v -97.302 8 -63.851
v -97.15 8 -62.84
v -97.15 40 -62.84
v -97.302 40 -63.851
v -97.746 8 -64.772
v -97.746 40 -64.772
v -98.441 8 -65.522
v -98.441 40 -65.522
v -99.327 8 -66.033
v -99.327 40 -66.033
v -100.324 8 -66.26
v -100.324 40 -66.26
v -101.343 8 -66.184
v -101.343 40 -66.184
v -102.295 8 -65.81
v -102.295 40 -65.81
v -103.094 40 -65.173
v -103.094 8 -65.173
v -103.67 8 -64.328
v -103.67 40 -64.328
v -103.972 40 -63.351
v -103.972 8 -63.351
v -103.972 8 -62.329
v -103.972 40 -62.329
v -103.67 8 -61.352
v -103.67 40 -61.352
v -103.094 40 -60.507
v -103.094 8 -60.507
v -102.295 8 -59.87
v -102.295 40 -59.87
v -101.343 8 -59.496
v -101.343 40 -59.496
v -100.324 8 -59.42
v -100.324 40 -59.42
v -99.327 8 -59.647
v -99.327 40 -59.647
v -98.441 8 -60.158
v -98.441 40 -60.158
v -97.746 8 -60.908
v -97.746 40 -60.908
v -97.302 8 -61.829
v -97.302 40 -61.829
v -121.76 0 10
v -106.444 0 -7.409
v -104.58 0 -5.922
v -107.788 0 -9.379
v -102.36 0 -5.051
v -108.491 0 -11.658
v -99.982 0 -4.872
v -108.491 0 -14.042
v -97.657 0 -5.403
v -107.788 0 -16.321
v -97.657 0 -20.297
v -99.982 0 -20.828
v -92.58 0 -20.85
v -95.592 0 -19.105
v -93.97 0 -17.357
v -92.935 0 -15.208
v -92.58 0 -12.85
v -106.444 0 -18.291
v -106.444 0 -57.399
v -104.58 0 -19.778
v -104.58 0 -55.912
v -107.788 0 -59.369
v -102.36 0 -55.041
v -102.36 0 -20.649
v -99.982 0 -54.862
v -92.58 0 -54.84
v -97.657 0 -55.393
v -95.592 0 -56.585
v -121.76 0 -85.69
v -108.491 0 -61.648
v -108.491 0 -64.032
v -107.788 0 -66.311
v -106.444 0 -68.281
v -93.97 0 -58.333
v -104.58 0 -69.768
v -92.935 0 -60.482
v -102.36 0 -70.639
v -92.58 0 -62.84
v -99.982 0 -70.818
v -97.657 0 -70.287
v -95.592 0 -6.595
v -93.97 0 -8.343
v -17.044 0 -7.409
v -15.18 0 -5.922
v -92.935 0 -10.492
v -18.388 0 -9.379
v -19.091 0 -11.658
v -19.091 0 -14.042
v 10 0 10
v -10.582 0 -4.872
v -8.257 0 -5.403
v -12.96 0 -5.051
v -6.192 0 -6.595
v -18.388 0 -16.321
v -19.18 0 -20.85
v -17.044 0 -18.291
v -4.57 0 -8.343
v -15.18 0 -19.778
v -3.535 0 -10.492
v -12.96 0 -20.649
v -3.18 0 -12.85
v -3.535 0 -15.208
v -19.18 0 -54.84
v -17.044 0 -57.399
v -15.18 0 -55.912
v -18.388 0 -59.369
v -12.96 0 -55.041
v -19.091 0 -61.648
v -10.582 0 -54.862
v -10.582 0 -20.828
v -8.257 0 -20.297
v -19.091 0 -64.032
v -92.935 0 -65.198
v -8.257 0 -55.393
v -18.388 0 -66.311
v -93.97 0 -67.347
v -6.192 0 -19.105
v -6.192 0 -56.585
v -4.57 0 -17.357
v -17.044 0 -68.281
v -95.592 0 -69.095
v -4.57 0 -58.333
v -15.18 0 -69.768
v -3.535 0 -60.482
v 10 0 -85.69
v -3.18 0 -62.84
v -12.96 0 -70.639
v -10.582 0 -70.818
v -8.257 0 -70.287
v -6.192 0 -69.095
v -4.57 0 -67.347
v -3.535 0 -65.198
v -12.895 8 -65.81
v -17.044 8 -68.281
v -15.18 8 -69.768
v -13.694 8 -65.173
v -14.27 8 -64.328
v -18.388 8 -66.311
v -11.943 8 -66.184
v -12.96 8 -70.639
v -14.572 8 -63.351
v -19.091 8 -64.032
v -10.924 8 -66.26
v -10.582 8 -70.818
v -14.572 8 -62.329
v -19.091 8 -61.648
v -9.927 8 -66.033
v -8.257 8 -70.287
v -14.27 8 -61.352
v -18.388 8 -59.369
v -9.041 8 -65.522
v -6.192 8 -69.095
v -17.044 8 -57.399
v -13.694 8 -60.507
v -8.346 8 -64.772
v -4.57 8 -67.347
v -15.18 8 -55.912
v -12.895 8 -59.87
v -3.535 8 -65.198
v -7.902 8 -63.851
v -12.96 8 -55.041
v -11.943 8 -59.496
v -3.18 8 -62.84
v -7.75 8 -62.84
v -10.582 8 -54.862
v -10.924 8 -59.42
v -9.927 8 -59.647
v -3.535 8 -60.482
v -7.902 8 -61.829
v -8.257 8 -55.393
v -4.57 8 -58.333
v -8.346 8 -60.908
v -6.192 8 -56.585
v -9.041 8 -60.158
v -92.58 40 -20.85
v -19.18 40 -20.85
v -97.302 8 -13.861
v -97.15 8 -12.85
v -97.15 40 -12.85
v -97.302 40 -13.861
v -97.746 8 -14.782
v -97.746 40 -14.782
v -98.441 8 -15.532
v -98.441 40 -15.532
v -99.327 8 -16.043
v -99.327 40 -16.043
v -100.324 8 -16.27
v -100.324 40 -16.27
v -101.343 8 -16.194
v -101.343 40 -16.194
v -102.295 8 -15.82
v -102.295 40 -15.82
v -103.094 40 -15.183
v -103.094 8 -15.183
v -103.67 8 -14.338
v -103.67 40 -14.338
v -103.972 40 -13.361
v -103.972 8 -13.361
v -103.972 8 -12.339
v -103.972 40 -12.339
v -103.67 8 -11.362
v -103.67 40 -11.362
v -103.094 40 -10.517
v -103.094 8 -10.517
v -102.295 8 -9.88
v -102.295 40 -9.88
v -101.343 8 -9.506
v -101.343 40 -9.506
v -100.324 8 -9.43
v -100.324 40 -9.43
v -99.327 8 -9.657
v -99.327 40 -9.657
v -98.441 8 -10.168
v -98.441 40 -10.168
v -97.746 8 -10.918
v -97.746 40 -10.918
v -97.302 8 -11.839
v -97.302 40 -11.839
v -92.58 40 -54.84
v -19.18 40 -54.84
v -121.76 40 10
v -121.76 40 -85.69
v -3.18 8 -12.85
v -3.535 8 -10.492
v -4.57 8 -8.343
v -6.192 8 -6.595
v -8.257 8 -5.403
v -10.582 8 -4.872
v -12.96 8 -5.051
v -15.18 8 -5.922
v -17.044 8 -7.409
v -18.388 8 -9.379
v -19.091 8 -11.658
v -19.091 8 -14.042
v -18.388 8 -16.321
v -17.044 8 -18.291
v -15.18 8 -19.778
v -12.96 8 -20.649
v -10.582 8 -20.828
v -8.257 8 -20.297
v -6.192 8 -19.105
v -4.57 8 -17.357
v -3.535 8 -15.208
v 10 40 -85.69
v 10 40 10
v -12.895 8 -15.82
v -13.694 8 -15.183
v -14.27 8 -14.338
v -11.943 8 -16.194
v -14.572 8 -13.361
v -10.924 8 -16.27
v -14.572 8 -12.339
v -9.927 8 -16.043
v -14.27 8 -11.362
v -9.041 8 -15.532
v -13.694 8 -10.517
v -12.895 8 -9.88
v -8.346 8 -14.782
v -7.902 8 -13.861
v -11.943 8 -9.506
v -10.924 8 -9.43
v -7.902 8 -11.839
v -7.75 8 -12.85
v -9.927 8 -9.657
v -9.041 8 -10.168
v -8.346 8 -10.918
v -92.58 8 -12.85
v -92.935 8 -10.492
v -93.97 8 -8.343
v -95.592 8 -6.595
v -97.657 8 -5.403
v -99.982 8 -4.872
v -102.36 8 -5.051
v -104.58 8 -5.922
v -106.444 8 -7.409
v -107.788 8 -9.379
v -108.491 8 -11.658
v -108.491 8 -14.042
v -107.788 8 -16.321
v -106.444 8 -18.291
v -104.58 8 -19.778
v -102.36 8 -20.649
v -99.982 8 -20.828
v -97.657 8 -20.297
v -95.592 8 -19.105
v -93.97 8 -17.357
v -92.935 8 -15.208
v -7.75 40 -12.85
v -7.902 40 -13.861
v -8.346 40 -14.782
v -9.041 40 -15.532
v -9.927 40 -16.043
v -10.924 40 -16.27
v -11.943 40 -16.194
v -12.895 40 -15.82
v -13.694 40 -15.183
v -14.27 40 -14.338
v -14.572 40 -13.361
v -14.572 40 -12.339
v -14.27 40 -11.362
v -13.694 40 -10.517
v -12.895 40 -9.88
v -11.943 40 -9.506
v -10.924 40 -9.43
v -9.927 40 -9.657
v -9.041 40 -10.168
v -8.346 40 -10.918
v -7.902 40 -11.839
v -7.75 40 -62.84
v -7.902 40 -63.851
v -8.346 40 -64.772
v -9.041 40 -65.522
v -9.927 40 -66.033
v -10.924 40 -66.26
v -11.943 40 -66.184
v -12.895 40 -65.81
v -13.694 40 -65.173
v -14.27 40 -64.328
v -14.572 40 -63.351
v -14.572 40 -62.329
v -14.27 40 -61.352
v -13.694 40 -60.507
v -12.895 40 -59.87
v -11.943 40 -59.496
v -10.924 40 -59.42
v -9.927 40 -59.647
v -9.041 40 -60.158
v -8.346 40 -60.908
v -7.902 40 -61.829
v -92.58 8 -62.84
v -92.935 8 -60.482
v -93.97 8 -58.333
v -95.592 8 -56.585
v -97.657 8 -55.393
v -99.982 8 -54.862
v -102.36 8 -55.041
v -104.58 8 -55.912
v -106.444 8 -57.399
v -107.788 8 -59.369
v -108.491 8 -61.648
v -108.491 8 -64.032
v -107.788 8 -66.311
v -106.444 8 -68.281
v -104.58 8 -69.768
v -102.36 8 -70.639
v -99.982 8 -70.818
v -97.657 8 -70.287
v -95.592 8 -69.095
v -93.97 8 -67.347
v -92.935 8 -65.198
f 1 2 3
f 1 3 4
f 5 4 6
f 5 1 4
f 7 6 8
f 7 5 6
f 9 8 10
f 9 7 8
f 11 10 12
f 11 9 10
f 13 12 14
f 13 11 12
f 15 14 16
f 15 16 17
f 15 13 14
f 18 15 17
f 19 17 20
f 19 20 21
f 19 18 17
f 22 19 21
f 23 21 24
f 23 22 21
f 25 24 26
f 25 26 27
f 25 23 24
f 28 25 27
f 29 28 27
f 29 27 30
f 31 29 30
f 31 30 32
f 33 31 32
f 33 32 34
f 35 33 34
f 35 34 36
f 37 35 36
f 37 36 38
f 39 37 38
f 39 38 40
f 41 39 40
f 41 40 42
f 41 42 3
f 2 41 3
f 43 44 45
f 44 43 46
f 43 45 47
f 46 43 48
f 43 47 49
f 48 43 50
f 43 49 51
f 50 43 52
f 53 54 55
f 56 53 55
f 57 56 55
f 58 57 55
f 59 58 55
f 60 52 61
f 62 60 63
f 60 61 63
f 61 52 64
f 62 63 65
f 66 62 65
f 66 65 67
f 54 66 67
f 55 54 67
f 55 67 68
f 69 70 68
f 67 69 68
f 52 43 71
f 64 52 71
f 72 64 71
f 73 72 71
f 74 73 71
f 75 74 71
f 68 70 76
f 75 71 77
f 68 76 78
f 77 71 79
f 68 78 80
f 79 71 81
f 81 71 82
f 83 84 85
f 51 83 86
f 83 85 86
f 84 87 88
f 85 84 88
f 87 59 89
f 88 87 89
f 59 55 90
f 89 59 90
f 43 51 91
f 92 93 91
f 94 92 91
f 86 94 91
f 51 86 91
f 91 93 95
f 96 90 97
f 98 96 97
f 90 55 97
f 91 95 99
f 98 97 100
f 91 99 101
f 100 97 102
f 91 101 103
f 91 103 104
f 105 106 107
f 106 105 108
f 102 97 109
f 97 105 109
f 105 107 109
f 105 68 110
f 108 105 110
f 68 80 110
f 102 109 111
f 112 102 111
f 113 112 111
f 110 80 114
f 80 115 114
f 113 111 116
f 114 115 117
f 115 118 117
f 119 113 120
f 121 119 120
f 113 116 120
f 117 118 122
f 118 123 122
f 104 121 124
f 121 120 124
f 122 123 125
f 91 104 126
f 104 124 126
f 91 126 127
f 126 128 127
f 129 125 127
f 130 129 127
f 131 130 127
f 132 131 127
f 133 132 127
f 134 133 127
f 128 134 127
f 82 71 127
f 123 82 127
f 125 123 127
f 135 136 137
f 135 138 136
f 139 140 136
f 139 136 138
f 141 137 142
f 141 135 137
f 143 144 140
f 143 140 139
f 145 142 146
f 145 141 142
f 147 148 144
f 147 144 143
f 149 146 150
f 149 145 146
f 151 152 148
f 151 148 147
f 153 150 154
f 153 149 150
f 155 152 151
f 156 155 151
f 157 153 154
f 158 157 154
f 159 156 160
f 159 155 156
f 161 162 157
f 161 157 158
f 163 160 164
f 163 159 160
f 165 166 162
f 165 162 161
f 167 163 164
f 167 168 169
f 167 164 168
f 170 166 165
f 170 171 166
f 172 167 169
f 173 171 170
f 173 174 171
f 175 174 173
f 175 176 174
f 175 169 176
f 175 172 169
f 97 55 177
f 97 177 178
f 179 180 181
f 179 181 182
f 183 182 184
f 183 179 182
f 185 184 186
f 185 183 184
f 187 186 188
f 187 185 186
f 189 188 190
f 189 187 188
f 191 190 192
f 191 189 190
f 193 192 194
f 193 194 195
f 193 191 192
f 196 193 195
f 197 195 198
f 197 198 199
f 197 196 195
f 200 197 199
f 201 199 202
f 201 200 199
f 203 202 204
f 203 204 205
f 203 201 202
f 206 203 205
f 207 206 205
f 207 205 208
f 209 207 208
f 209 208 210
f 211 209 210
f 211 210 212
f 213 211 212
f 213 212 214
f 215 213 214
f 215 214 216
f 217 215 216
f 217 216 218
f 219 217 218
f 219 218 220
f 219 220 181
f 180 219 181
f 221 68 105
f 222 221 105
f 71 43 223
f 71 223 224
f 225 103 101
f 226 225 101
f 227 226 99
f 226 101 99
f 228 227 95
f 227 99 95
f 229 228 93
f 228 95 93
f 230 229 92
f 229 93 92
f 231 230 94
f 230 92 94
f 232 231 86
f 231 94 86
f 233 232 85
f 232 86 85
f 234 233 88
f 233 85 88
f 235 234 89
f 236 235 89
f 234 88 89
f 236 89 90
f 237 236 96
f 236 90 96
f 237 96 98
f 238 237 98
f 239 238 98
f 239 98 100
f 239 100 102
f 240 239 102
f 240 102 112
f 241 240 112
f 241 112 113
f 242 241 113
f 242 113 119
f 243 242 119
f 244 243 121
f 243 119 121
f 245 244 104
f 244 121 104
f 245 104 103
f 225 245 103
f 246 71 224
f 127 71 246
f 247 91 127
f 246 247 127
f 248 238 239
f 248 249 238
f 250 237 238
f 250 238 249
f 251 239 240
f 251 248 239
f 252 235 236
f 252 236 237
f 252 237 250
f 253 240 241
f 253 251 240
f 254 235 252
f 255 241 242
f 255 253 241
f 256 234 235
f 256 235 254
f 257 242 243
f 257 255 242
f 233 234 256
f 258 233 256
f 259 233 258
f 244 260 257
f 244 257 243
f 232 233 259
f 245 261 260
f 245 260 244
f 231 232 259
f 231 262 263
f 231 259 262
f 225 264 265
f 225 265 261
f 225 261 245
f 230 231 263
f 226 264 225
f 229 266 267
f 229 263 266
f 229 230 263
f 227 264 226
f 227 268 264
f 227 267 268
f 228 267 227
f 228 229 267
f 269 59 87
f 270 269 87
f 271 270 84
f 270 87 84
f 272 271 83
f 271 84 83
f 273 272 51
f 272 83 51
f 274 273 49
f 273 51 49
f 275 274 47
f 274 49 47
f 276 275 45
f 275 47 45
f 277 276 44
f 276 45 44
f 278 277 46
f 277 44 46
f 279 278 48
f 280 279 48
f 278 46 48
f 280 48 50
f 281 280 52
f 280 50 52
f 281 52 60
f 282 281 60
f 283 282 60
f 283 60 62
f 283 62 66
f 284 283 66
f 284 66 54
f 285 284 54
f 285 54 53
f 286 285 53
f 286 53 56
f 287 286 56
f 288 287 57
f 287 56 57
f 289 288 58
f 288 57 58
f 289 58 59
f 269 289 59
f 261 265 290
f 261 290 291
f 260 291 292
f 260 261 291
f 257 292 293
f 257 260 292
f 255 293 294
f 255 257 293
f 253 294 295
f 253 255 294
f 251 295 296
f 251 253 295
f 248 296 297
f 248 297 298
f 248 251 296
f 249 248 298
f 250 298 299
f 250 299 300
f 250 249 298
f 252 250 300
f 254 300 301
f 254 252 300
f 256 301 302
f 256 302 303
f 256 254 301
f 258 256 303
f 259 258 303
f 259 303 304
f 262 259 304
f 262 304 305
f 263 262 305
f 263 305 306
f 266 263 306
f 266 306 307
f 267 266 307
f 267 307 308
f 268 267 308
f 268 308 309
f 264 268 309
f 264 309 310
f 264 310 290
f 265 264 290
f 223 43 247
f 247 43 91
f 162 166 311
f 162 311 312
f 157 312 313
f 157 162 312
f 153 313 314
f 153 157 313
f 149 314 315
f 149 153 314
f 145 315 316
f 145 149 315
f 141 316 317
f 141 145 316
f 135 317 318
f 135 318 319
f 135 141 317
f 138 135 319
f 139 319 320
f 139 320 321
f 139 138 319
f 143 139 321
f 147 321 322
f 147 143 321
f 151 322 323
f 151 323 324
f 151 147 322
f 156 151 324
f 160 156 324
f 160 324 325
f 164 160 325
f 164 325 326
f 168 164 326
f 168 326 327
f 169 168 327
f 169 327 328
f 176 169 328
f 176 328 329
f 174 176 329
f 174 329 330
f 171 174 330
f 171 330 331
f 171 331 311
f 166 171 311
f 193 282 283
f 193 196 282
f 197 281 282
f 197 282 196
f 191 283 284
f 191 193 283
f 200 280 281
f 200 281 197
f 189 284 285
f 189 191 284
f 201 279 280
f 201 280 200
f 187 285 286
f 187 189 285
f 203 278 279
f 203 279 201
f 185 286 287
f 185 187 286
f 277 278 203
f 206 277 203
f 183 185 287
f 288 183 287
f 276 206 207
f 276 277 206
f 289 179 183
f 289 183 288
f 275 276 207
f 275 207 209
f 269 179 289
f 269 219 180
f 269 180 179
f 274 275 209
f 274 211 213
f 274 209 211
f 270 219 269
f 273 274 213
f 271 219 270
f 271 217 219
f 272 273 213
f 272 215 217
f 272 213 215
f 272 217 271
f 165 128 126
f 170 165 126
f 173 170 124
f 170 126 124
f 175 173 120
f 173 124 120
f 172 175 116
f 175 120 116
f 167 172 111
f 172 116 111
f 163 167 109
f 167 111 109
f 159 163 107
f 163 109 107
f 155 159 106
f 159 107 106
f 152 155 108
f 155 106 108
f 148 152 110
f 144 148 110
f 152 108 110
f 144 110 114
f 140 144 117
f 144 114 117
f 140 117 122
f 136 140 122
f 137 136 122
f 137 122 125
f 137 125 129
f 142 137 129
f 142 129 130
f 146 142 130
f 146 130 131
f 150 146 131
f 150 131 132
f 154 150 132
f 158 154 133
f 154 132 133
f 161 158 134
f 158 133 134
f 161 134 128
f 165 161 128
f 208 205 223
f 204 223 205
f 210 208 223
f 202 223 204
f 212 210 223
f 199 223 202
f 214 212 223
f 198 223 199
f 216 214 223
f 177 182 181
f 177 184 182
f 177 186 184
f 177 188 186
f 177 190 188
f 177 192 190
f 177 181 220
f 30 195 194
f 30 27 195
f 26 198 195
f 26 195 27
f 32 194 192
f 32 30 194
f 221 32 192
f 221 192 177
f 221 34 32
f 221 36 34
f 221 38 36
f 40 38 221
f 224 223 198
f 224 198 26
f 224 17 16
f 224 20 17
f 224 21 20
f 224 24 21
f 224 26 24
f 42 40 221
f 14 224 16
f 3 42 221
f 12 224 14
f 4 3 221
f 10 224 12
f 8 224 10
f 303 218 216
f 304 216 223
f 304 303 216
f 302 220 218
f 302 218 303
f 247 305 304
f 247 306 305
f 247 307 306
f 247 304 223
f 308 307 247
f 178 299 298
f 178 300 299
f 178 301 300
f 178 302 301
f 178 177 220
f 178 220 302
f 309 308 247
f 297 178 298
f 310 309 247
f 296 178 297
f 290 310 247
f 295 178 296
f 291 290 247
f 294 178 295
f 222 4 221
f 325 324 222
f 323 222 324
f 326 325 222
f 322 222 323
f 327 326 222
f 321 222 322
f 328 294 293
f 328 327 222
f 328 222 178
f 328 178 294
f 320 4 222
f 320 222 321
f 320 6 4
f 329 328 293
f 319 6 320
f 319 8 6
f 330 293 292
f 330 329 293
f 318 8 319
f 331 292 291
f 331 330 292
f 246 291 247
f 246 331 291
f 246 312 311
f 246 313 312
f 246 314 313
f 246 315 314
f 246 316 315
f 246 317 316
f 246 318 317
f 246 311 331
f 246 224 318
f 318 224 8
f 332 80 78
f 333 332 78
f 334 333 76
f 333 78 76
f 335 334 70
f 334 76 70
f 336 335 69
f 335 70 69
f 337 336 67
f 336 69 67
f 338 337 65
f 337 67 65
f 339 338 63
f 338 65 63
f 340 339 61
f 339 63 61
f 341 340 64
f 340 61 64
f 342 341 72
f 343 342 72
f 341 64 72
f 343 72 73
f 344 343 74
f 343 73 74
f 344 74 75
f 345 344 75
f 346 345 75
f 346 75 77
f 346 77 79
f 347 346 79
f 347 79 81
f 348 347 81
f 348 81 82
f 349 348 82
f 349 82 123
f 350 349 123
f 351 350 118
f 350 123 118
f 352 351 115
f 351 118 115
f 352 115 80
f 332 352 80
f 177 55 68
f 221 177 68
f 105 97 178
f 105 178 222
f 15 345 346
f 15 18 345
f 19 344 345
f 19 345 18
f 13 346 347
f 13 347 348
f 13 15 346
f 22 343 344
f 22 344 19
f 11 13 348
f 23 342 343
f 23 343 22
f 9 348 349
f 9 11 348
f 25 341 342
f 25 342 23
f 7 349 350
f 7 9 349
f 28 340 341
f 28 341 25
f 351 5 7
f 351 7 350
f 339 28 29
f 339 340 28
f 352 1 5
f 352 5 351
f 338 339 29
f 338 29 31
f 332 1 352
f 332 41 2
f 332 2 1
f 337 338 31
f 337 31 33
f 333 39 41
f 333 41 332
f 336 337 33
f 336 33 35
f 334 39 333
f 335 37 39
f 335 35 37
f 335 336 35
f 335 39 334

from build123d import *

# Parameters (mm, degrees)
SKETCH8_W           = 131.76
SKETCH8_H           = 95.69
SKETCH8_R           = 3.43
SKETCH8_W_2         = 73.4
SKETCH8_H_2         = 33.99
BOSS_EXTRUDE4_DEPTH = 40
SKETCH9_R           = 8
CUT_EXTRUDE2_DEPTH  = 8


with BuildPart() as part:
    # Sketch8 → Boss-Extrude4 (new body)
    with BuildSketch(Plane(origin=(0, 0, 0), x_dir=(1, 0, 0), z_dir=(0, 1, 0))):
        with Locations((-55.88, 37.845)):
            Rectangle(SKETCH8_W, SKETCH8_H)
        with Locations((-100.58, 12.85)):
            Circle(SKETCH8_R, mode=Mode.SUBTRACT)
        with Locations((-100.58, 62.84)):
            Circle(SKETCH8_R, mode=Mode.SUBTRACT)
        with Locations((-11.18, 62.84)):
            Circle(SKETCH8_R, mode=Mode.SUBTRACT)
        with Locations((-11.18, 12.85)):
            Circle(SKETCH8_R, mode=Mode.SUBTRACT)
        with Locations((-55.88, 37.845)):
            Rectangle(SKETCH8_W_2, SKETCH8_H_2, mode=Mode.SUBTRACT)
    extrude(amount=BOSS_EXTRUDE4_DEPTH)

    # Sketch9 → Cut-Extrude2 (cut)
    with BuildSketch(Plane.XZ):
        with Locations((-100.58, -12.85)):
            Circle(SKETCH9_R)
        with Locations((-11.18, -12.85)):
            Circle(SKETCH9_R)
        with Locations((-11.18, -62.84)):
            Circle(SKETCH9_R)
        with Locations((-100.58, -62.84)):
            Circle(SKETCH9_R)
    extrude(amount=-CUT_EXTRUDE2_DEPTH, mode=Mode.SUBTRACT)


solid = part.part
